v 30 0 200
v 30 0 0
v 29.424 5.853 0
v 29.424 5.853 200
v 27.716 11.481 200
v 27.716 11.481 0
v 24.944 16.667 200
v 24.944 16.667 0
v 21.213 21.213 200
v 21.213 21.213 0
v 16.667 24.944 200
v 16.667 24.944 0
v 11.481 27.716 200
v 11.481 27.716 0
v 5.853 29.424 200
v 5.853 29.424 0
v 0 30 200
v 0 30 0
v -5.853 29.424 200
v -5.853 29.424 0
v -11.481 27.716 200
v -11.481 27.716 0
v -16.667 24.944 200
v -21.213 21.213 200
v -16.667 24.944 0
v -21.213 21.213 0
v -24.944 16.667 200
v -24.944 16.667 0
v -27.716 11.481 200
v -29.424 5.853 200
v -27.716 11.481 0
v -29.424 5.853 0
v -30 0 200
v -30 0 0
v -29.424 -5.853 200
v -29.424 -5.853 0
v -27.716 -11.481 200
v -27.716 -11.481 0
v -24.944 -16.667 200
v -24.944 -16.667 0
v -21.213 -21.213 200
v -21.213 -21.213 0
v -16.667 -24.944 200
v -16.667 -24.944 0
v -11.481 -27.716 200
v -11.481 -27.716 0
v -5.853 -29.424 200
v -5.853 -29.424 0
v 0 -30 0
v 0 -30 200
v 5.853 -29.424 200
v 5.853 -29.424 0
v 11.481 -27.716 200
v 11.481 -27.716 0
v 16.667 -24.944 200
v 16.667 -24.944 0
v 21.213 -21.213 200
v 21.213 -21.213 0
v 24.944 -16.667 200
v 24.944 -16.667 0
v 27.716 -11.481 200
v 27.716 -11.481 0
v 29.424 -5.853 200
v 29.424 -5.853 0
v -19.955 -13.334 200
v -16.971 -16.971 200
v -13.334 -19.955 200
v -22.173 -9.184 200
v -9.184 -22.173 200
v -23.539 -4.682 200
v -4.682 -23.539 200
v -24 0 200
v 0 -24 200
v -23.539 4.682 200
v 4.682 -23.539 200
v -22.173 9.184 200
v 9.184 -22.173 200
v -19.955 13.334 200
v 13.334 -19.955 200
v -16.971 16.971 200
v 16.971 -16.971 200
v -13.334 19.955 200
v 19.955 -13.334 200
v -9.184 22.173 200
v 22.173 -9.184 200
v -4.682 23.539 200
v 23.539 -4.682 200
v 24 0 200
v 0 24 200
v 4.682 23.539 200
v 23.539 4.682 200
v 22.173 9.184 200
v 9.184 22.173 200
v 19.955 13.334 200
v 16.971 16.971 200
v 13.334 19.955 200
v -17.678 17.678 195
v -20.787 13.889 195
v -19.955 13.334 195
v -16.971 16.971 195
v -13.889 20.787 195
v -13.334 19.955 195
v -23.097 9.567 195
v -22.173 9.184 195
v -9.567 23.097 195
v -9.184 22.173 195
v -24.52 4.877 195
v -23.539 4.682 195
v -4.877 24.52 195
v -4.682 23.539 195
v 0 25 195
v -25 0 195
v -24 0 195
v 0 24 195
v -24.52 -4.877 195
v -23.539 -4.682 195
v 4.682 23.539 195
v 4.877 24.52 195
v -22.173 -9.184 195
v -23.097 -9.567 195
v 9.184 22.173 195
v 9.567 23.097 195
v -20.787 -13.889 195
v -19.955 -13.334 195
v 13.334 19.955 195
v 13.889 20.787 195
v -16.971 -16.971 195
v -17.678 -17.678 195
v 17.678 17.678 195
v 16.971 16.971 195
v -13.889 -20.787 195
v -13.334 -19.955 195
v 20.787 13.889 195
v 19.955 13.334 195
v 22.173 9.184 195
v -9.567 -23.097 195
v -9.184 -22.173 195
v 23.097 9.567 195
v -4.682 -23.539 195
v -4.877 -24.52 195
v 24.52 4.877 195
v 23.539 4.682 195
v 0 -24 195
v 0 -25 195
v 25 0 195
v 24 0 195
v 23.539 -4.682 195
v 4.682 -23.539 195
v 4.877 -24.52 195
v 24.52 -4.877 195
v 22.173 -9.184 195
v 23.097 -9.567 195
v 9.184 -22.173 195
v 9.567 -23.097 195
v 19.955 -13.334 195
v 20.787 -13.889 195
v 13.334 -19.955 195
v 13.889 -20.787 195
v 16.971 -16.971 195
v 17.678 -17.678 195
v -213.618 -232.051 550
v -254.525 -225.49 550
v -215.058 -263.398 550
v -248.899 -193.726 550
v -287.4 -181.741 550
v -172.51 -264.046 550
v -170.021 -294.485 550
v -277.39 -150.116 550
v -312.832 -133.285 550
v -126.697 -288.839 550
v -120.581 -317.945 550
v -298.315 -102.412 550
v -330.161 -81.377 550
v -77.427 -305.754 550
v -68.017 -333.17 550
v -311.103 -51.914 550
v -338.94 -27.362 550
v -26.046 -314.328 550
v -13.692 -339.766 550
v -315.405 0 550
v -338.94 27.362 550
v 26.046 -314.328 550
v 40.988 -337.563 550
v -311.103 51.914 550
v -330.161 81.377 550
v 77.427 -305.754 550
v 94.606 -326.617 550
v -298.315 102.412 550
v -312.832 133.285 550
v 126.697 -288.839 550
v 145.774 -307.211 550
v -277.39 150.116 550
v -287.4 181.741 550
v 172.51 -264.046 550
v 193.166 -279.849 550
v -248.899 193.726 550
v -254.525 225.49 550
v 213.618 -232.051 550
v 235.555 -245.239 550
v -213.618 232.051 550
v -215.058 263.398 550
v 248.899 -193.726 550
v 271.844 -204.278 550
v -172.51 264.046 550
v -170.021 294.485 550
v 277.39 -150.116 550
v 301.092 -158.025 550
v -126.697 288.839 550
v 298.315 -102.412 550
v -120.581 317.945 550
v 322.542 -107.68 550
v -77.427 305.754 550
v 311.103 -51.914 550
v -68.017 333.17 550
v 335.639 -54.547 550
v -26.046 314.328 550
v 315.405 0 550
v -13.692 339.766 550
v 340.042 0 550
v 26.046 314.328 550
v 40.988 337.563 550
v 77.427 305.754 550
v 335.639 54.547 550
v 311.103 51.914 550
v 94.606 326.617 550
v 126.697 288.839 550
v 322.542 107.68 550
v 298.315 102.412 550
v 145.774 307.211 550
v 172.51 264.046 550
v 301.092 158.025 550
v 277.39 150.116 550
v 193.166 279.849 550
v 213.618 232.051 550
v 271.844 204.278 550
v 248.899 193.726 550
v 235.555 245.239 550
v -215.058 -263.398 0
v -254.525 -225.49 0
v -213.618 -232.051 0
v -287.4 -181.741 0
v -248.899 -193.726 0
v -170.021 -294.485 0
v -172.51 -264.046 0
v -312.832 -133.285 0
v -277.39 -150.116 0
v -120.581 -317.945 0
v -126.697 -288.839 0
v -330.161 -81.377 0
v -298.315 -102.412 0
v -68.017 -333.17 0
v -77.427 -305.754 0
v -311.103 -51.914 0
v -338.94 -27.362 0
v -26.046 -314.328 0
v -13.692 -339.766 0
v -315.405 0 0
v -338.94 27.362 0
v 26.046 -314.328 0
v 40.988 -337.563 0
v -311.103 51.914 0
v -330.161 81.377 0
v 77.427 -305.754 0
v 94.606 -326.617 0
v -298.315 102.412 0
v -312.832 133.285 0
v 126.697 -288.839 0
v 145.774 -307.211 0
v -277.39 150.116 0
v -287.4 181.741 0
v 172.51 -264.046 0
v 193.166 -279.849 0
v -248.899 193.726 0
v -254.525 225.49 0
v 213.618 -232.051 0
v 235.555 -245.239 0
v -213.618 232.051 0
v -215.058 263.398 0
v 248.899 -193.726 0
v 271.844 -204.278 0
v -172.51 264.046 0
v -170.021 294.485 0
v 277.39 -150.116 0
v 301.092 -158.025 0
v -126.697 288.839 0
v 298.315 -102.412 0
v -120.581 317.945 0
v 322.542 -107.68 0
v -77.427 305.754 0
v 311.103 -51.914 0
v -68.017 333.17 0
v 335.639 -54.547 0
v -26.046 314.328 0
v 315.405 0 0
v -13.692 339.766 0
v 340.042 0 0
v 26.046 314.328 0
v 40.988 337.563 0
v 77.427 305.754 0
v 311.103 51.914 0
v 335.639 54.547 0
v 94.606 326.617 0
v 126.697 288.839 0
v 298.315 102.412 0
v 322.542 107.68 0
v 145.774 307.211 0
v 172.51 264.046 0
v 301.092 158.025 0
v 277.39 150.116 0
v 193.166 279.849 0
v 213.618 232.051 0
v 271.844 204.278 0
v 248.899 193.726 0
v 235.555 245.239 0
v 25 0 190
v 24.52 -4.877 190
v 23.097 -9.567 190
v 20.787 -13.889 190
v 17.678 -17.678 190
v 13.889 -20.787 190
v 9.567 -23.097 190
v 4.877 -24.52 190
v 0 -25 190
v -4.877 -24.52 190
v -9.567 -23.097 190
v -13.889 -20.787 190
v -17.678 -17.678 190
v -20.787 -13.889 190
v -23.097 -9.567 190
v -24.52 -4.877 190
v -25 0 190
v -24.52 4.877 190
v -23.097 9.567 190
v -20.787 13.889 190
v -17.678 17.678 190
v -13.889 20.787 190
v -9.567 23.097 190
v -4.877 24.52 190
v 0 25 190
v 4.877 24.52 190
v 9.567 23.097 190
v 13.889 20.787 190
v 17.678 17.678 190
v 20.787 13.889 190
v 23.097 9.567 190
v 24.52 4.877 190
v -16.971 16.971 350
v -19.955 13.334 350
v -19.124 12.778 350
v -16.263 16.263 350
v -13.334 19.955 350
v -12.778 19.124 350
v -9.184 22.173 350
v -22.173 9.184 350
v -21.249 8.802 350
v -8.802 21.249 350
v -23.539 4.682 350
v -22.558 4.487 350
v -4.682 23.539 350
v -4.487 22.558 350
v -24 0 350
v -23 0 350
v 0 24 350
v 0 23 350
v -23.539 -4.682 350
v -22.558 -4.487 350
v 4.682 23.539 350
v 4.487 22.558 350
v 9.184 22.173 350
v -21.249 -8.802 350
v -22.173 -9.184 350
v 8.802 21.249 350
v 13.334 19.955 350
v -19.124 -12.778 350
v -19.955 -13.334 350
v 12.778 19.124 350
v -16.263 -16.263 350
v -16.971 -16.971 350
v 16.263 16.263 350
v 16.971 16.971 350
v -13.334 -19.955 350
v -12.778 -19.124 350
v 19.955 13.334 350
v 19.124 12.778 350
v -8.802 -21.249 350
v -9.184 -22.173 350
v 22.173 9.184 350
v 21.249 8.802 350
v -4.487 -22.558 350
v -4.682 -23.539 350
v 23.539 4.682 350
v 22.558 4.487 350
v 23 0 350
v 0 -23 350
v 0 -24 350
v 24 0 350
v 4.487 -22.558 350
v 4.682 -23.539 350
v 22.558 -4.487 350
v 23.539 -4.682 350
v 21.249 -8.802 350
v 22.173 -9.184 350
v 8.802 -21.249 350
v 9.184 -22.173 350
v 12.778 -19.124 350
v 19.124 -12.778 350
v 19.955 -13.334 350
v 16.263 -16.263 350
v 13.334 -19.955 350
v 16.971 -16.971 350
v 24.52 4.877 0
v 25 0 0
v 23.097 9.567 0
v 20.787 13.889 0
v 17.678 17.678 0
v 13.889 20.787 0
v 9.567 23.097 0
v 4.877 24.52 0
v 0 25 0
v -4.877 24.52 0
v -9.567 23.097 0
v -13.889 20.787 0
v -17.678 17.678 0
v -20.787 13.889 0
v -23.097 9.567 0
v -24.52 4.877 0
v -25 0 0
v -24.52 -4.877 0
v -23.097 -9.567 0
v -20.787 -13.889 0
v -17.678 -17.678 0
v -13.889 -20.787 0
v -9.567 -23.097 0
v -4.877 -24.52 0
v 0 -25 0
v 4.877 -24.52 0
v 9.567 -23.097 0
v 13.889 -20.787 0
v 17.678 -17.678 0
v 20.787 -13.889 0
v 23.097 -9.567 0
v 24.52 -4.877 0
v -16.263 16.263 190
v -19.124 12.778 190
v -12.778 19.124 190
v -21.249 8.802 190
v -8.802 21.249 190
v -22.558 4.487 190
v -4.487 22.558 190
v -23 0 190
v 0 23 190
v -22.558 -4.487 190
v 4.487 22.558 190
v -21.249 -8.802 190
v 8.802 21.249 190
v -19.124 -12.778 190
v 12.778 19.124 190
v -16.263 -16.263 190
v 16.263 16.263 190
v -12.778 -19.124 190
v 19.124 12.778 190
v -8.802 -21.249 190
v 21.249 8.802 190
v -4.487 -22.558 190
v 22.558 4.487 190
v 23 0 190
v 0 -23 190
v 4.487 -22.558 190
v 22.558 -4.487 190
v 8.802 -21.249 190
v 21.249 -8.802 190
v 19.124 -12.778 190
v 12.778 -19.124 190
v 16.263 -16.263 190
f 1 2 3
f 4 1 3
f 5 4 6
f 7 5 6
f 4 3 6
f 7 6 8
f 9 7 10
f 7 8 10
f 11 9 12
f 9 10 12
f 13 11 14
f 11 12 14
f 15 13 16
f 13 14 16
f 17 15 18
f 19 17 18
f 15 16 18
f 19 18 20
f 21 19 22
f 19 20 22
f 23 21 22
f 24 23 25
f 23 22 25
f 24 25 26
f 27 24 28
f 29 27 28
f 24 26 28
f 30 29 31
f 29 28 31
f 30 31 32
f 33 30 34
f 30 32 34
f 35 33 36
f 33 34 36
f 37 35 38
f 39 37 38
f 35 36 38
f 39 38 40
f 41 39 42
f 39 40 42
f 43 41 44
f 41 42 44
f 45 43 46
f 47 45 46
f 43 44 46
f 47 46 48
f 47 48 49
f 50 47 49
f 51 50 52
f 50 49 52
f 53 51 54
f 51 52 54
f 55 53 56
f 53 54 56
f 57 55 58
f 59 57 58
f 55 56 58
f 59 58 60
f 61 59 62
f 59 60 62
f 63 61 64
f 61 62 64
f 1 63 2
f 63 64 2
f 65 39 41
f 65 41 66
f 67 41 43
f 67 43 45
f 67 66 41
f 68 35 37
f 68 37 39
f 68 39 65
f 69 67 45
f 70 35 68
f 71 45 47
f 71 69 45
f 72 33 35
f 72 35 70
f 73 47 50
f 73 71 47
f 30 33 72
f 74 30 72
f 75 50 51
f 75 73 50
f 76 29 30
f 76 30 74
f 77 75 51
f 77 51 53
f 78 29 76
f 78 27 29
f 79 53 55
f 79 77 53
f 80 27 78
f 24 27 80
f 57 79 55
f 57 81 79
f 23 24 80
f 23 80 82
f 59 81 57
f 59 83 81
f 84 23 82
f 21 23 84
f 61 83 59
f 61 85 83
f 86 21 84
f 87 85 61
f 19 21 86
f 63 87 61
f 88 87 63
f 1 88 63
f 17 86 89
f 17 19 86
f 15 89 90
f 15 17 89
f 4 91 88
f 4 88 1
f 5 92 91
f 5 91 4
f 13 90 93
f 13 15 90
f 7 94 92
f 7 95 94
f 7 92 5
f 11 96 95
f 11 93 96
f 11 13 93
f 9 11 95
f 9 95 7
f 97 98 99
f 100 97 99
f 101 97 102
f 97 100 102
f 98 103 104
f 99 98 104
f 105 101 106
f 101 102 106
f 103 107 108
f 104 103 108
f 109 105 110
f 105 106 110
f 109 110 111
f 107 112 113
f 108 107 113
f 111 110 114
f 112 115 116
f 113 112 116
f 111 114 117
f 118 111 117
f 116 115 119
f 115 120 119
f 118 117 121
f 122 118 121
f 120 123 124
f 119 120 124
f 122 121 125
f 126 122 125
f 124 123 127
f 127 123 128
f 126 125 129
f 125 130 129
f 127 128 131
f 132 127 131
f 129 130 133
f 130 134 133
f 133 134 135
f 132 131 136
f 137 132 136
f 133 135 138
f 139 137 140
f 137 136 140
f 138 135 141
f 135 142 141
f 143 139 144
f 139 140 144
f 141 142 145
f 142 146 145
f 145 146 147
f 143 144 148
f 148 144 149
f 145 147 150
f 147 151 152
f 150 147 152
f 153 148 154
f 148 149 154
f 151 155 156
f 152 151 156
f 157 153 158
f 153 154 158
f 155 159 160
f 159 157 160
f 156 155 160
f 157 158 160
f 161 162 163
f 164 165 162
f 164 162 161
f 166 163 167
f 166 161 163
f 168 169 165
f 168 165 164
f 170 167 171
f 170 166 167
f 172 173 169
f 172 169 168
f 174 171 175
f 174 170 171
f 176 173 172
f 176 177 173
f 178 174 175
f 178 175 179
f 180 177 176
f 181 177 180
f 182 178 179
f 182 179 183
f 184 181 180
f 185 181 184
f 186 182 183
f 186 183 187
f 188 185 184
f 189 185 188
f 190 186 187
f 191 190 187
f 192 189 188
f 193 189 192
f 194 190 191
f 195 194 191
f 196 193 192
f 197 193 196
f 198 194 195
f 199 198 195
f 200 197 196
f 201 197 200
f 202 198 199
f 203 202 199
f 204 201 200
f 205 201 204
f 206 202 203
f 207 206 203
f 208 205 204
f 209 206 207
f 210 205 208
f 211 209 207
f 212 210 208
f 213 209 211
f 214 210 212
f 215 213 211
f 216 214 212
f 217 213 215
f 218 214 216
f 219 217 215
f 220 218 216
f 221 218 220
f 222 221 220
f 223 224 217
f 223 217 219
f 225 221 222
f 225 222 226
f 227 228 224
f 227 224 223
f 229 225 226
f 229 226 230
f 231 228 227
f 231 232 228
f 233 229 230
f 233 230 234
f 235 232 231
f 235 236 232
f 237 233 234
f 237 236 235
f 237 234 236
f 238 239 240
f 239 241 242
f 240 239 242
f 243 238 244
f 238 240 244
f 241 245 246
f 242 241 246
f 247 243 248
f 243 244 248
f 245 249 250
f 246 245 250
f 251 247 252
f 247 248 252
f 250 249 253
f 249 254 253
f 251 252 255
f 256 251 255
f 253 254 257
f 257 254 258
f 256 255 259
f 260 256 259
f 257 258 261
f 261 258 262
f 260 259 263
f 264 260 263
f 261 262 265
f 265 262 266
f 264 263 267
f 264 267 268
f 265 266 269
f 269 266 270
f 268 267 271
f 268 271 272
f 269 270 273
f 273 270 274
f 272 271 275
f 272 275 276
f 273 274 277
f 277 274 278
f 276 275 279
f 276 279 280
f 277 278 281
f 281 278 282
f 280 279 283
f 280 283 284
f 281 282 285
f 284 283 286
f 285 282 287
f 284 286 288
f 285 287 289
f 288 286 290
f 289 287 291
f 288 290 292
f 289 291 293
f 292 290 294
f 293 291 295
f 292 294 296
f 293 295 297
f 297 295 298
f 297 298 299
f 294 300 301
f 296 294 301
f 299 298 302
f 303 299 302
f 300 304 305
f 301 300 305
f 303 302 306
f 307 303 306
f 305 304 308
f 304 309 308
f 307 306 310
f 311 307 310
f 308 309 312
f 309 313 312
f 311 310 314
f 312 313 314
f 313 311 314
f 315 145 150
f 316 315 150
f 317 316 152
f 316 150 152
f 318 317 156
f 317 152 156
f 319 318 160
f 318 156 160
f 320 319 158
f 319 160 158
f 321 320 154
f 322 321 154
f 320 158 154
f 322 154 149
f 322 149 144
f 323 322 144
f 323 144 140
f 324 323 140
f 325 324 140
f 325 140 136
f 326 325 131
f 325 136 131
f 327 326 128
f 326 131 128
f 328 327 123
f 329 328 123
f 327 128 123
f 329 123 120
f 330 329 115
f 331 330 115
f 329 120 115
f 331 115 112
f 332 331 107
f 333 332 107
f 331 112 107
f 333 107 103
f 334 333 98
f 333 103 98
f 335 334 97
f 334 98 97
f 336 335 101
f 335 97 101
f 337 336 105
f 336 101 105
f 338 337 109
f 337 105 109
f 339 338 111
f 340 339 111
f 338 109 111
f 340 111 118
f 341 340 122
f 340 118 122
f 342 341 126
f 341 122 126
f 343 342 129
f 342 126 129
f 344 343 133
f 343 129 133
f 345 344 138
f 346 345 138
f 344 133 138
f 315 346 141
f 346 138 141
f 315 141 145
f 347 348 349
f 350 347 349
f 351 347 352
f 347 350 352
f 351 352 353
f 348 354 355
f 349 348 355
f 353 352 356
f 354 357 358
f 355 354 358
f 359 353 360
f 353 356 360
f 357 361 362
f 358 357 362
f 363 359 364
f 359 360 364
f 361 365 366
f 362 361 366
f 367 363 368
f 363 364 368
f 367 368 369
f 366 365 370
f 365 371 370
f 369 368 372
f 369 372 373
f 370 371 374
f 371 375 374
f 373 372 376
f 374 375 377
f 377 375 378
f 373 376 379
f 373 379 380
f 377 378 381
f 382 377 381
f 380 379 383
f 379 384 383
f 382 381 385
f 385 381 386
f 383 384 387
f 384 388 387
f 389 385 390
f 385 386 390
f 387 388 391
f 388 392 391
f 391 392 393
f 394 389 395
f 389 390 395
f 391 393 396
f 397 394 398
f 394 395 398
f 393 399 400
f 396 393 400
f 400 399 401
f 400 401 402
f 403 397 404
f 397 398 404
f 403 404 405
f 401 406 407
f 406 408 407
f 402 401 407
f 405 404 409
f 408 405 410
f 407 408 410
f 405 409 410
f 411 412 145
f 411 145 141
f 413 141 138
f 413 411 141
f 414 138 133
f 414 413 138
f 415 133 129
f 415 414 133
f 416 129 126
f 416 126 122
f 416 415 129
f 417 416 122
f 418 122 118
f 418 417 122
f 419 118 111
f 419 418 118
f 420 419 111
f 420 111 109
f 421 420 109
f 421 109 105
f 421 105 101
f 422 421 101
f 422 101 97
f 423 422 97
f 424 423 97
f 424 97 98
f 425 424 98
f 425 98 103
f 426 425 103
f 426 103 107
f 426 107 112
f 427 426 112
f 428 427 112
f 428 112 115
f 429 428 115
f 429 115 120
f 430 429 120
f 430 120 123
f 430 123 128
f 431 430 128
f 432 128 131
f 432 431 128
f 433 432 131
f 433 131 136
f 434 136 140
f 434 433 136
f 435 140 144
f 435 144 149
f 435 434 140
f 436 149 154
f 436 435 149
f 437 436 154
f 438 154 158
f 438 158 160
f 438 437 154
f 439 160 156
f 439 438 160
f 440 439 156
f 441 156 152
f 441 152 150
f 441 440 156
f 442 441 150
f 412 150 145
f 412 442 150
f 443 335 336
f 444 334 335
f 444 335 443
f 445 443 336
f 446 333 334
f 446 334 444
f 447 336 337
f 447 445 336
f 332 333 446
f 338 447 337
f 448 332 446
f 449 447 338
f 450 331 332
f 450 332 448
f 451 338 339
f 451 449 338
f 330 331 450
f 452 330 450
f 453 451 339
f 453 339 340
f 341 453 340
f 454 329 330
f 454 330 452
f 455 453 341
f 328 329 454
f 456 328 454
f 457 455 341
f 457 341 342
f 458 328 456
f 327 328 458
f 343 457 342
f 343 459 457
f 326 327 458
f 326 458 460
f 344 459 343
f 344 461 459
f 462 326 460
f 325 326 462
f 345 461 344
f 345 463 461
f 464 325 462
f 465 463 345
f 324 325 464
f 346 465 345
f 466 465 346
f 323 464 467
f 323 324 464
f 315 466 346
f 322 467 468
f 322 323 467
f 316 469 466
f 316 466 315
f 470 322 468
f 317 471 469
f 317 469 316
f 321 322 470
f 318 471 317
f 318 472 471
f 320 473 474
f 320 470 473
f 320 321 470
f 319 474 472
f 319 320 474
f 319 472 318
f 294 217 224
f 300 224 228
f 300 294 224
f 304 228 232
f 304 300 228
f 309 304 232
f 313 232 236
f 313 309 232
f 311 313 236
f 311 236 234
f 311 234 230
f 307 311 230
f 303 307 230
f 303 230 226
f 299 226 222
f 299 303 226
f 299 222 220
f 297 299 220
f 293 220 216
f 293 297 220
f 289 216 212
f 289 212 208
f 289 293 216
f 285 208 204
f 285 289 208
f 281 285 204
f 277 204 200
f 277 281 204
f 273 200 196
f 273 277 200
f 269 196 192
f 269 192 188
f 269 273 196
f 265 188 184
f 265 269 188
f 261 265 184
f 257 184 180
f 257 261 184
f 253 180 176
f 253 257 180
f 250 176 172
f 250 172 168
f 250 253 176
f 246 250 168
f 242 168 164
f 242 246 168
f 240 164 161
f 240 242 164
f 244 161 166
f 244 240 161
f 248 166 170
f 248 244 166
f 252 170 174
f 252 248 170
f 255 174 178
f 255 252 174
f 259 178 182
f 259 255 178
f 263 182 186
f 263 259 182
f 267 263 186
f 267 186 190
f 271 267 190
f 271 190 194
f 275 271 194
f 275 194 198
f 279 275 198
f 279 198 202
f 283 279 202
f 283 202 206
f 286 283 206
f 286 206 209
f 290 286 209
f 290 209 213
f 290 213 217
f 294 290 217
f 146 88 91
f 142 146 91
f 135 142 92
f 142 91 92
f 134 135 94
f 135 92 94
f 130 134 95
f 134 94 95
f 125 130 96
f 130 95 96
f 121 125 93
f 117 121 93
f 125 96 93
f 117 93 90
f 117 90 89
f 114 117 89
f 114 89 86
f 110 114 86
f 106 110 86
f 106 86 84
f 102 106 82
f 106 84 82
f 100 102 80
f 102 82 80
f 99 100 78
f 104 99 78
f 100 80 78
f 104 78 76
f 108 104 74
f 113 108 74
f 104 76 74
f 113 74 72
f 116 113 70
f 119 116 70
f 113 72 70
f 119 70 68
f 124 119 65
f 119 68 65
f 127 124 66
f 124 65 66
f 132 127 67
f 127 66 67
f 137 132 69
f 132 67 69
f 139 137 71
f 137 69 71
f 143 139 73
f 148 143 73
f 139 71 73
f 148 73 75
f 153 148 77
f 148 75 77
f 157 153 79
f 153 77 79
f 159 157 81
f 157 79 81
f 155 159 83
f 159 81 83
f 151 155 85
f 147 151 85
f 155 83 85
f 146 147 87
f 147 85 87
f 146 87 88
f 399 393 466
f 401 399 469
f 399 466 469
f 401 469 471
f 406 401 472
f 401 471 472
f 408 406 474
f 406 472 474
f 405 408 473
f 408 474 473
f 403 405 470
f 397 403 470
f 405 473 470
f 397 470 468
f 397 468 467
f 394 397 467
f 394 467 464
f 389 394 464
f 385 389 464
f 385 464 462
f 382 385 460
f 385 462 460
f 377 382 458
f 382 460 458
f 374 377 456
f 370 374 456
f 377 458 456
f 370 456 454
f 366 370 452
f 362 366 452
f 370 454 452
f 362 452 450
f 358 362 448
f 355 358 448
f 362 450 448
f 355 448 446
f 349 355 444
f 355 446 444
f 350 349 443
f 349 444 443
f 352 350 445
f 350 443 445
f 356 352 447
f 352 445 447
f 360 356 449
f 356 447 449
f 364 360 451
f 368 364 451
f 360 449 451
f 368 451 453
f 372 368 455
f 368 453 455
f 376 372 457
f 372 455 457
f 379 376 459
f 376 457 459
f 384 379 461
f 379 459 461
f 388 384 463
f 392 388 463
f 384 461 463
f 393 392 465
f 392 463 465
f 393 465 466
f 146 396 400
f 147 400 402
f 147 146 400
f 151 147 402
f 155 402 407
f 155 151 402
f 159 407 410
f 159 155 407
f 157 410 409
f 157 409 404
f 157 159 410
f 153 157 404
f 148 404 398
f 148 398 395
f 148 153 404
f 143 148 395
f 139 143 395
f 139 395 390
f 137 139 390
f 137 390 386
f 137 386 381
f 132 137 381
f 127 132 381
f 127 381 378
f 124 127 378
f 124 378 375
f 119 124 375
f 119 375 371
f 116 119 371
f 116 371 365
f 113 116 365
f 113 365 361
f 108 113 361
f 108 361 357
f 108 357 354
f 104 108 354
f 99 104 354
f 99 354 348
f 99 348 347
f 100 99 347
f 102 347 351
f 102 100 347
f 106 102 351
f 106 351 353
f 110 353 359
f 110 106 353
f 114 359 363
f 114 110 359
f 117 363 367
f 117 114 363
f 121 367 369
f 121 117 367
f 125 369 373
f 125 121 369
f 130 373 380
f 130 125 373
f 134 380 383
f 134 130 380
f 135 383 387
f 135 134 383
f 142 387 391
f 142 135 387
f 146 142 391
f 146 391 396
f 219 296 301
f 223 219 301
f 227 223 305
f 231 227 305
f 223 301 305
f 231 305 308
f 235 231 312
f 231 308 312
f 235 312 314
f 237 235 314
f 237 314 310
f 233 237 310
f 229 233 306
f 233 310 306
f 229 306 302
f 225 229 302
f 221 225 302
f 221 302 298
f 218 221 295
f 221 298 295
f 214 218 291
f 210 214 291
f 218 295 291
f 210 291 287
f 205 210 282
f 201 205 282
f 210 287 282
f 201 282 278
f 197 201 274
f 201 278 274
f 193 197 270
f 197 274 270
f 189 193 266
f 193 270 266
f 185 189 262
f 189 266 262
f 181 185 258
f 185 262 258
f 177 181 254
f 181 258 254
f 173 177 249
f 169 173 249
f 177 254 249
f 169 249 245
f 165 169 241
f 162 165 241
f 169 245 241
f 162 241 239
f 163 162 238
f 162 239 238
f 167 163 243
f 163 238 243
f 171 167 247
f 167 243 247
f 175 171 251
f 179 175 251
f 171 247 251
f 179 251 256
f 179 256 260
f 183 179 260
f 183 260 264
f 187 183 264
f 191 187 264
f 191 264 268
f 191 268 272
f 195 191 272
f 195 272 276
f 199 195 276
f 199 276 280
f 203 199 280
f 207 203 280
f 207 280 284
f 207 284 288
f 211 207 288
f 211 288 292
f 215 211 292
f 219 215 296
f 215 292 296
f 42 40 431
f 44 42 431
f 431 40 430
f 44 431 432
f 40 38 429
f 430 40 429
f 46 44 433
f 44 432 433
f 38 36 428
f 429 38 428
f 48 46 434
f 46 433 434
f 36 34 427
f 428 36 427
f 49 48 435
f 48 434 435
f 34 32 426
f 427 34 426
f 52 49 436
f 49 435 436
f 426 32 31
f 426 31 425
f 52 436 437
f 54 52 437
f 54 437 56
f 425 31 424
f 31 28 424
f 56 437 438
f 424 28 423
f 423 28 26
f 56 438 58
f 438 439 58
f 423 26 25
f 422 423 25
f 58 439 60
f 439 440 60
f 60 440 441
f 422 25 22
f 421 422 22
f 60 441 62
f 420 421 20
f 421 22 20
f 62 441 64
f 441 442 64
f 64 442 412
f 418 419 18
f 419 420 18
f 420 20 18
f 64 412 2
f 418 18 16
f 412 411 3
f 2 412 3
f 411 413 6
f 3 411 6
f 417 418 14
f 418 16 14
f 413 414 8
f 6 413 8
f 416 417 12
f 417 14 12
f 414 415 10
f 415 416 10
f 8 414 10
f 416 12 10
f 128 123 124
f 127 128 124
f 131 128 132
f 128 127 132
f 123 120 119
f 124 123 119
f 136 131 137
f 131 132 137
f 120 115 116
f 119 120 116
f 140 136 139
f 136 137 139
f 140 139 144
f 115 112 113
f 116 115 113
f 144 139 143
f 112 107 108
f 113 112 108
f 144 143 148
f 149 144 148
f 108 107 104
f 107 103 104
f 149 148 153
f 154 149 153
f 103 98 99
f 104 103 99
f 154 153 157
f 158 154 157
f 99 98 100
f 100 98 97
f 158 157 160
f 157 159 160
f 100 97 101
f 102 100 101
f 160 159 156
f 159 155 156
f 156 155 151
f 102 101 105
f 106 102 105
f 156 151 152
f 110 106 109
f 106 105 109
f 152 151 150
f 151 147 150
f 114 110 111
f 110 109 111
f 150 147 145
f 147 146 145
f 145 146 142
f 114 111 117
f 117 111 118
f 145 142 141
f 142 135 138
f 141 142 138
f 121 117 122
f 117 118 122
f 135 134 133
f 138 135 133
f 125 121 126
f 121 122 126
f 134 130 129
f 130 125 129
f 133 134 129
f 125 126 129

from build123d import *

# Parameters (mm, degrees)
F0_R     = 30
F0_R_2   = 25
F1_DEPTH = 200
F3_R     = 340.0421742973
F3_R_2   = 315.4048789829
F4_DEPTH = 550
F2_R     = 25
F2_R_2   = 24
F5_DEPTH = 5
F6_R     = 25
F6_R_2   = 24
F7_DEPTH = 5
F8_R     = 24
F8_R_2   = 23
F9_DEPTH = 160


with BuildPart() as f1:
    # F0 (on Top) → F1 (new body)
    with BuildSketch(Plane.XY):
        Circle(F0_R)
        Circle(F0_R_2, mode=Mode.SUBTRACT)
    extrude(amount=F1_DEPTH)

    # F2 (on face) → F5 (join)
    with BuildSketch(Plane.XY.offset(200)):
        Circle(F2_R)
        Circle(F2_R_2, mode=Mode.SUBTRACT)
    extrude(amount=-F5_DEPTH)


with BuildPart() as f4:
    # F3 (on Top) → F4 (new body)
    with BuildSketch(Plane.XY):
        Circle(F3_R)
        Circle(F3_R_2, mode=Mode.SUBTRACT)
    extrude(amount=F4_DEPTH)


with BuildPart() as f7:
    # F6 (on face) → F7 (new body)
    with BuildSketch(Plane(origin=(0, 0, 195), x_dir=(1, 0, 0), z_dir=(0, 0, -1))):
        Circle(F6_R)
        Circle(F6_R_2, mode=Mode.SUBTRACT)
    extrude(amount=F7_DEPTH)

    # F8 (on face) → F9 (join)
    with BuildSketch(Plane(origin=(0, 0, 190), x_dir=(1, 0, 0), z_dir=(0, 0, -1))):
        Circle(F8_R)
        Circle(F8_R_2, mode=Mode.SUBTRACT)
    extrude(amount=-F9_DEPTH)


solid = Compound([f1.part, f4.part, f7.part])
